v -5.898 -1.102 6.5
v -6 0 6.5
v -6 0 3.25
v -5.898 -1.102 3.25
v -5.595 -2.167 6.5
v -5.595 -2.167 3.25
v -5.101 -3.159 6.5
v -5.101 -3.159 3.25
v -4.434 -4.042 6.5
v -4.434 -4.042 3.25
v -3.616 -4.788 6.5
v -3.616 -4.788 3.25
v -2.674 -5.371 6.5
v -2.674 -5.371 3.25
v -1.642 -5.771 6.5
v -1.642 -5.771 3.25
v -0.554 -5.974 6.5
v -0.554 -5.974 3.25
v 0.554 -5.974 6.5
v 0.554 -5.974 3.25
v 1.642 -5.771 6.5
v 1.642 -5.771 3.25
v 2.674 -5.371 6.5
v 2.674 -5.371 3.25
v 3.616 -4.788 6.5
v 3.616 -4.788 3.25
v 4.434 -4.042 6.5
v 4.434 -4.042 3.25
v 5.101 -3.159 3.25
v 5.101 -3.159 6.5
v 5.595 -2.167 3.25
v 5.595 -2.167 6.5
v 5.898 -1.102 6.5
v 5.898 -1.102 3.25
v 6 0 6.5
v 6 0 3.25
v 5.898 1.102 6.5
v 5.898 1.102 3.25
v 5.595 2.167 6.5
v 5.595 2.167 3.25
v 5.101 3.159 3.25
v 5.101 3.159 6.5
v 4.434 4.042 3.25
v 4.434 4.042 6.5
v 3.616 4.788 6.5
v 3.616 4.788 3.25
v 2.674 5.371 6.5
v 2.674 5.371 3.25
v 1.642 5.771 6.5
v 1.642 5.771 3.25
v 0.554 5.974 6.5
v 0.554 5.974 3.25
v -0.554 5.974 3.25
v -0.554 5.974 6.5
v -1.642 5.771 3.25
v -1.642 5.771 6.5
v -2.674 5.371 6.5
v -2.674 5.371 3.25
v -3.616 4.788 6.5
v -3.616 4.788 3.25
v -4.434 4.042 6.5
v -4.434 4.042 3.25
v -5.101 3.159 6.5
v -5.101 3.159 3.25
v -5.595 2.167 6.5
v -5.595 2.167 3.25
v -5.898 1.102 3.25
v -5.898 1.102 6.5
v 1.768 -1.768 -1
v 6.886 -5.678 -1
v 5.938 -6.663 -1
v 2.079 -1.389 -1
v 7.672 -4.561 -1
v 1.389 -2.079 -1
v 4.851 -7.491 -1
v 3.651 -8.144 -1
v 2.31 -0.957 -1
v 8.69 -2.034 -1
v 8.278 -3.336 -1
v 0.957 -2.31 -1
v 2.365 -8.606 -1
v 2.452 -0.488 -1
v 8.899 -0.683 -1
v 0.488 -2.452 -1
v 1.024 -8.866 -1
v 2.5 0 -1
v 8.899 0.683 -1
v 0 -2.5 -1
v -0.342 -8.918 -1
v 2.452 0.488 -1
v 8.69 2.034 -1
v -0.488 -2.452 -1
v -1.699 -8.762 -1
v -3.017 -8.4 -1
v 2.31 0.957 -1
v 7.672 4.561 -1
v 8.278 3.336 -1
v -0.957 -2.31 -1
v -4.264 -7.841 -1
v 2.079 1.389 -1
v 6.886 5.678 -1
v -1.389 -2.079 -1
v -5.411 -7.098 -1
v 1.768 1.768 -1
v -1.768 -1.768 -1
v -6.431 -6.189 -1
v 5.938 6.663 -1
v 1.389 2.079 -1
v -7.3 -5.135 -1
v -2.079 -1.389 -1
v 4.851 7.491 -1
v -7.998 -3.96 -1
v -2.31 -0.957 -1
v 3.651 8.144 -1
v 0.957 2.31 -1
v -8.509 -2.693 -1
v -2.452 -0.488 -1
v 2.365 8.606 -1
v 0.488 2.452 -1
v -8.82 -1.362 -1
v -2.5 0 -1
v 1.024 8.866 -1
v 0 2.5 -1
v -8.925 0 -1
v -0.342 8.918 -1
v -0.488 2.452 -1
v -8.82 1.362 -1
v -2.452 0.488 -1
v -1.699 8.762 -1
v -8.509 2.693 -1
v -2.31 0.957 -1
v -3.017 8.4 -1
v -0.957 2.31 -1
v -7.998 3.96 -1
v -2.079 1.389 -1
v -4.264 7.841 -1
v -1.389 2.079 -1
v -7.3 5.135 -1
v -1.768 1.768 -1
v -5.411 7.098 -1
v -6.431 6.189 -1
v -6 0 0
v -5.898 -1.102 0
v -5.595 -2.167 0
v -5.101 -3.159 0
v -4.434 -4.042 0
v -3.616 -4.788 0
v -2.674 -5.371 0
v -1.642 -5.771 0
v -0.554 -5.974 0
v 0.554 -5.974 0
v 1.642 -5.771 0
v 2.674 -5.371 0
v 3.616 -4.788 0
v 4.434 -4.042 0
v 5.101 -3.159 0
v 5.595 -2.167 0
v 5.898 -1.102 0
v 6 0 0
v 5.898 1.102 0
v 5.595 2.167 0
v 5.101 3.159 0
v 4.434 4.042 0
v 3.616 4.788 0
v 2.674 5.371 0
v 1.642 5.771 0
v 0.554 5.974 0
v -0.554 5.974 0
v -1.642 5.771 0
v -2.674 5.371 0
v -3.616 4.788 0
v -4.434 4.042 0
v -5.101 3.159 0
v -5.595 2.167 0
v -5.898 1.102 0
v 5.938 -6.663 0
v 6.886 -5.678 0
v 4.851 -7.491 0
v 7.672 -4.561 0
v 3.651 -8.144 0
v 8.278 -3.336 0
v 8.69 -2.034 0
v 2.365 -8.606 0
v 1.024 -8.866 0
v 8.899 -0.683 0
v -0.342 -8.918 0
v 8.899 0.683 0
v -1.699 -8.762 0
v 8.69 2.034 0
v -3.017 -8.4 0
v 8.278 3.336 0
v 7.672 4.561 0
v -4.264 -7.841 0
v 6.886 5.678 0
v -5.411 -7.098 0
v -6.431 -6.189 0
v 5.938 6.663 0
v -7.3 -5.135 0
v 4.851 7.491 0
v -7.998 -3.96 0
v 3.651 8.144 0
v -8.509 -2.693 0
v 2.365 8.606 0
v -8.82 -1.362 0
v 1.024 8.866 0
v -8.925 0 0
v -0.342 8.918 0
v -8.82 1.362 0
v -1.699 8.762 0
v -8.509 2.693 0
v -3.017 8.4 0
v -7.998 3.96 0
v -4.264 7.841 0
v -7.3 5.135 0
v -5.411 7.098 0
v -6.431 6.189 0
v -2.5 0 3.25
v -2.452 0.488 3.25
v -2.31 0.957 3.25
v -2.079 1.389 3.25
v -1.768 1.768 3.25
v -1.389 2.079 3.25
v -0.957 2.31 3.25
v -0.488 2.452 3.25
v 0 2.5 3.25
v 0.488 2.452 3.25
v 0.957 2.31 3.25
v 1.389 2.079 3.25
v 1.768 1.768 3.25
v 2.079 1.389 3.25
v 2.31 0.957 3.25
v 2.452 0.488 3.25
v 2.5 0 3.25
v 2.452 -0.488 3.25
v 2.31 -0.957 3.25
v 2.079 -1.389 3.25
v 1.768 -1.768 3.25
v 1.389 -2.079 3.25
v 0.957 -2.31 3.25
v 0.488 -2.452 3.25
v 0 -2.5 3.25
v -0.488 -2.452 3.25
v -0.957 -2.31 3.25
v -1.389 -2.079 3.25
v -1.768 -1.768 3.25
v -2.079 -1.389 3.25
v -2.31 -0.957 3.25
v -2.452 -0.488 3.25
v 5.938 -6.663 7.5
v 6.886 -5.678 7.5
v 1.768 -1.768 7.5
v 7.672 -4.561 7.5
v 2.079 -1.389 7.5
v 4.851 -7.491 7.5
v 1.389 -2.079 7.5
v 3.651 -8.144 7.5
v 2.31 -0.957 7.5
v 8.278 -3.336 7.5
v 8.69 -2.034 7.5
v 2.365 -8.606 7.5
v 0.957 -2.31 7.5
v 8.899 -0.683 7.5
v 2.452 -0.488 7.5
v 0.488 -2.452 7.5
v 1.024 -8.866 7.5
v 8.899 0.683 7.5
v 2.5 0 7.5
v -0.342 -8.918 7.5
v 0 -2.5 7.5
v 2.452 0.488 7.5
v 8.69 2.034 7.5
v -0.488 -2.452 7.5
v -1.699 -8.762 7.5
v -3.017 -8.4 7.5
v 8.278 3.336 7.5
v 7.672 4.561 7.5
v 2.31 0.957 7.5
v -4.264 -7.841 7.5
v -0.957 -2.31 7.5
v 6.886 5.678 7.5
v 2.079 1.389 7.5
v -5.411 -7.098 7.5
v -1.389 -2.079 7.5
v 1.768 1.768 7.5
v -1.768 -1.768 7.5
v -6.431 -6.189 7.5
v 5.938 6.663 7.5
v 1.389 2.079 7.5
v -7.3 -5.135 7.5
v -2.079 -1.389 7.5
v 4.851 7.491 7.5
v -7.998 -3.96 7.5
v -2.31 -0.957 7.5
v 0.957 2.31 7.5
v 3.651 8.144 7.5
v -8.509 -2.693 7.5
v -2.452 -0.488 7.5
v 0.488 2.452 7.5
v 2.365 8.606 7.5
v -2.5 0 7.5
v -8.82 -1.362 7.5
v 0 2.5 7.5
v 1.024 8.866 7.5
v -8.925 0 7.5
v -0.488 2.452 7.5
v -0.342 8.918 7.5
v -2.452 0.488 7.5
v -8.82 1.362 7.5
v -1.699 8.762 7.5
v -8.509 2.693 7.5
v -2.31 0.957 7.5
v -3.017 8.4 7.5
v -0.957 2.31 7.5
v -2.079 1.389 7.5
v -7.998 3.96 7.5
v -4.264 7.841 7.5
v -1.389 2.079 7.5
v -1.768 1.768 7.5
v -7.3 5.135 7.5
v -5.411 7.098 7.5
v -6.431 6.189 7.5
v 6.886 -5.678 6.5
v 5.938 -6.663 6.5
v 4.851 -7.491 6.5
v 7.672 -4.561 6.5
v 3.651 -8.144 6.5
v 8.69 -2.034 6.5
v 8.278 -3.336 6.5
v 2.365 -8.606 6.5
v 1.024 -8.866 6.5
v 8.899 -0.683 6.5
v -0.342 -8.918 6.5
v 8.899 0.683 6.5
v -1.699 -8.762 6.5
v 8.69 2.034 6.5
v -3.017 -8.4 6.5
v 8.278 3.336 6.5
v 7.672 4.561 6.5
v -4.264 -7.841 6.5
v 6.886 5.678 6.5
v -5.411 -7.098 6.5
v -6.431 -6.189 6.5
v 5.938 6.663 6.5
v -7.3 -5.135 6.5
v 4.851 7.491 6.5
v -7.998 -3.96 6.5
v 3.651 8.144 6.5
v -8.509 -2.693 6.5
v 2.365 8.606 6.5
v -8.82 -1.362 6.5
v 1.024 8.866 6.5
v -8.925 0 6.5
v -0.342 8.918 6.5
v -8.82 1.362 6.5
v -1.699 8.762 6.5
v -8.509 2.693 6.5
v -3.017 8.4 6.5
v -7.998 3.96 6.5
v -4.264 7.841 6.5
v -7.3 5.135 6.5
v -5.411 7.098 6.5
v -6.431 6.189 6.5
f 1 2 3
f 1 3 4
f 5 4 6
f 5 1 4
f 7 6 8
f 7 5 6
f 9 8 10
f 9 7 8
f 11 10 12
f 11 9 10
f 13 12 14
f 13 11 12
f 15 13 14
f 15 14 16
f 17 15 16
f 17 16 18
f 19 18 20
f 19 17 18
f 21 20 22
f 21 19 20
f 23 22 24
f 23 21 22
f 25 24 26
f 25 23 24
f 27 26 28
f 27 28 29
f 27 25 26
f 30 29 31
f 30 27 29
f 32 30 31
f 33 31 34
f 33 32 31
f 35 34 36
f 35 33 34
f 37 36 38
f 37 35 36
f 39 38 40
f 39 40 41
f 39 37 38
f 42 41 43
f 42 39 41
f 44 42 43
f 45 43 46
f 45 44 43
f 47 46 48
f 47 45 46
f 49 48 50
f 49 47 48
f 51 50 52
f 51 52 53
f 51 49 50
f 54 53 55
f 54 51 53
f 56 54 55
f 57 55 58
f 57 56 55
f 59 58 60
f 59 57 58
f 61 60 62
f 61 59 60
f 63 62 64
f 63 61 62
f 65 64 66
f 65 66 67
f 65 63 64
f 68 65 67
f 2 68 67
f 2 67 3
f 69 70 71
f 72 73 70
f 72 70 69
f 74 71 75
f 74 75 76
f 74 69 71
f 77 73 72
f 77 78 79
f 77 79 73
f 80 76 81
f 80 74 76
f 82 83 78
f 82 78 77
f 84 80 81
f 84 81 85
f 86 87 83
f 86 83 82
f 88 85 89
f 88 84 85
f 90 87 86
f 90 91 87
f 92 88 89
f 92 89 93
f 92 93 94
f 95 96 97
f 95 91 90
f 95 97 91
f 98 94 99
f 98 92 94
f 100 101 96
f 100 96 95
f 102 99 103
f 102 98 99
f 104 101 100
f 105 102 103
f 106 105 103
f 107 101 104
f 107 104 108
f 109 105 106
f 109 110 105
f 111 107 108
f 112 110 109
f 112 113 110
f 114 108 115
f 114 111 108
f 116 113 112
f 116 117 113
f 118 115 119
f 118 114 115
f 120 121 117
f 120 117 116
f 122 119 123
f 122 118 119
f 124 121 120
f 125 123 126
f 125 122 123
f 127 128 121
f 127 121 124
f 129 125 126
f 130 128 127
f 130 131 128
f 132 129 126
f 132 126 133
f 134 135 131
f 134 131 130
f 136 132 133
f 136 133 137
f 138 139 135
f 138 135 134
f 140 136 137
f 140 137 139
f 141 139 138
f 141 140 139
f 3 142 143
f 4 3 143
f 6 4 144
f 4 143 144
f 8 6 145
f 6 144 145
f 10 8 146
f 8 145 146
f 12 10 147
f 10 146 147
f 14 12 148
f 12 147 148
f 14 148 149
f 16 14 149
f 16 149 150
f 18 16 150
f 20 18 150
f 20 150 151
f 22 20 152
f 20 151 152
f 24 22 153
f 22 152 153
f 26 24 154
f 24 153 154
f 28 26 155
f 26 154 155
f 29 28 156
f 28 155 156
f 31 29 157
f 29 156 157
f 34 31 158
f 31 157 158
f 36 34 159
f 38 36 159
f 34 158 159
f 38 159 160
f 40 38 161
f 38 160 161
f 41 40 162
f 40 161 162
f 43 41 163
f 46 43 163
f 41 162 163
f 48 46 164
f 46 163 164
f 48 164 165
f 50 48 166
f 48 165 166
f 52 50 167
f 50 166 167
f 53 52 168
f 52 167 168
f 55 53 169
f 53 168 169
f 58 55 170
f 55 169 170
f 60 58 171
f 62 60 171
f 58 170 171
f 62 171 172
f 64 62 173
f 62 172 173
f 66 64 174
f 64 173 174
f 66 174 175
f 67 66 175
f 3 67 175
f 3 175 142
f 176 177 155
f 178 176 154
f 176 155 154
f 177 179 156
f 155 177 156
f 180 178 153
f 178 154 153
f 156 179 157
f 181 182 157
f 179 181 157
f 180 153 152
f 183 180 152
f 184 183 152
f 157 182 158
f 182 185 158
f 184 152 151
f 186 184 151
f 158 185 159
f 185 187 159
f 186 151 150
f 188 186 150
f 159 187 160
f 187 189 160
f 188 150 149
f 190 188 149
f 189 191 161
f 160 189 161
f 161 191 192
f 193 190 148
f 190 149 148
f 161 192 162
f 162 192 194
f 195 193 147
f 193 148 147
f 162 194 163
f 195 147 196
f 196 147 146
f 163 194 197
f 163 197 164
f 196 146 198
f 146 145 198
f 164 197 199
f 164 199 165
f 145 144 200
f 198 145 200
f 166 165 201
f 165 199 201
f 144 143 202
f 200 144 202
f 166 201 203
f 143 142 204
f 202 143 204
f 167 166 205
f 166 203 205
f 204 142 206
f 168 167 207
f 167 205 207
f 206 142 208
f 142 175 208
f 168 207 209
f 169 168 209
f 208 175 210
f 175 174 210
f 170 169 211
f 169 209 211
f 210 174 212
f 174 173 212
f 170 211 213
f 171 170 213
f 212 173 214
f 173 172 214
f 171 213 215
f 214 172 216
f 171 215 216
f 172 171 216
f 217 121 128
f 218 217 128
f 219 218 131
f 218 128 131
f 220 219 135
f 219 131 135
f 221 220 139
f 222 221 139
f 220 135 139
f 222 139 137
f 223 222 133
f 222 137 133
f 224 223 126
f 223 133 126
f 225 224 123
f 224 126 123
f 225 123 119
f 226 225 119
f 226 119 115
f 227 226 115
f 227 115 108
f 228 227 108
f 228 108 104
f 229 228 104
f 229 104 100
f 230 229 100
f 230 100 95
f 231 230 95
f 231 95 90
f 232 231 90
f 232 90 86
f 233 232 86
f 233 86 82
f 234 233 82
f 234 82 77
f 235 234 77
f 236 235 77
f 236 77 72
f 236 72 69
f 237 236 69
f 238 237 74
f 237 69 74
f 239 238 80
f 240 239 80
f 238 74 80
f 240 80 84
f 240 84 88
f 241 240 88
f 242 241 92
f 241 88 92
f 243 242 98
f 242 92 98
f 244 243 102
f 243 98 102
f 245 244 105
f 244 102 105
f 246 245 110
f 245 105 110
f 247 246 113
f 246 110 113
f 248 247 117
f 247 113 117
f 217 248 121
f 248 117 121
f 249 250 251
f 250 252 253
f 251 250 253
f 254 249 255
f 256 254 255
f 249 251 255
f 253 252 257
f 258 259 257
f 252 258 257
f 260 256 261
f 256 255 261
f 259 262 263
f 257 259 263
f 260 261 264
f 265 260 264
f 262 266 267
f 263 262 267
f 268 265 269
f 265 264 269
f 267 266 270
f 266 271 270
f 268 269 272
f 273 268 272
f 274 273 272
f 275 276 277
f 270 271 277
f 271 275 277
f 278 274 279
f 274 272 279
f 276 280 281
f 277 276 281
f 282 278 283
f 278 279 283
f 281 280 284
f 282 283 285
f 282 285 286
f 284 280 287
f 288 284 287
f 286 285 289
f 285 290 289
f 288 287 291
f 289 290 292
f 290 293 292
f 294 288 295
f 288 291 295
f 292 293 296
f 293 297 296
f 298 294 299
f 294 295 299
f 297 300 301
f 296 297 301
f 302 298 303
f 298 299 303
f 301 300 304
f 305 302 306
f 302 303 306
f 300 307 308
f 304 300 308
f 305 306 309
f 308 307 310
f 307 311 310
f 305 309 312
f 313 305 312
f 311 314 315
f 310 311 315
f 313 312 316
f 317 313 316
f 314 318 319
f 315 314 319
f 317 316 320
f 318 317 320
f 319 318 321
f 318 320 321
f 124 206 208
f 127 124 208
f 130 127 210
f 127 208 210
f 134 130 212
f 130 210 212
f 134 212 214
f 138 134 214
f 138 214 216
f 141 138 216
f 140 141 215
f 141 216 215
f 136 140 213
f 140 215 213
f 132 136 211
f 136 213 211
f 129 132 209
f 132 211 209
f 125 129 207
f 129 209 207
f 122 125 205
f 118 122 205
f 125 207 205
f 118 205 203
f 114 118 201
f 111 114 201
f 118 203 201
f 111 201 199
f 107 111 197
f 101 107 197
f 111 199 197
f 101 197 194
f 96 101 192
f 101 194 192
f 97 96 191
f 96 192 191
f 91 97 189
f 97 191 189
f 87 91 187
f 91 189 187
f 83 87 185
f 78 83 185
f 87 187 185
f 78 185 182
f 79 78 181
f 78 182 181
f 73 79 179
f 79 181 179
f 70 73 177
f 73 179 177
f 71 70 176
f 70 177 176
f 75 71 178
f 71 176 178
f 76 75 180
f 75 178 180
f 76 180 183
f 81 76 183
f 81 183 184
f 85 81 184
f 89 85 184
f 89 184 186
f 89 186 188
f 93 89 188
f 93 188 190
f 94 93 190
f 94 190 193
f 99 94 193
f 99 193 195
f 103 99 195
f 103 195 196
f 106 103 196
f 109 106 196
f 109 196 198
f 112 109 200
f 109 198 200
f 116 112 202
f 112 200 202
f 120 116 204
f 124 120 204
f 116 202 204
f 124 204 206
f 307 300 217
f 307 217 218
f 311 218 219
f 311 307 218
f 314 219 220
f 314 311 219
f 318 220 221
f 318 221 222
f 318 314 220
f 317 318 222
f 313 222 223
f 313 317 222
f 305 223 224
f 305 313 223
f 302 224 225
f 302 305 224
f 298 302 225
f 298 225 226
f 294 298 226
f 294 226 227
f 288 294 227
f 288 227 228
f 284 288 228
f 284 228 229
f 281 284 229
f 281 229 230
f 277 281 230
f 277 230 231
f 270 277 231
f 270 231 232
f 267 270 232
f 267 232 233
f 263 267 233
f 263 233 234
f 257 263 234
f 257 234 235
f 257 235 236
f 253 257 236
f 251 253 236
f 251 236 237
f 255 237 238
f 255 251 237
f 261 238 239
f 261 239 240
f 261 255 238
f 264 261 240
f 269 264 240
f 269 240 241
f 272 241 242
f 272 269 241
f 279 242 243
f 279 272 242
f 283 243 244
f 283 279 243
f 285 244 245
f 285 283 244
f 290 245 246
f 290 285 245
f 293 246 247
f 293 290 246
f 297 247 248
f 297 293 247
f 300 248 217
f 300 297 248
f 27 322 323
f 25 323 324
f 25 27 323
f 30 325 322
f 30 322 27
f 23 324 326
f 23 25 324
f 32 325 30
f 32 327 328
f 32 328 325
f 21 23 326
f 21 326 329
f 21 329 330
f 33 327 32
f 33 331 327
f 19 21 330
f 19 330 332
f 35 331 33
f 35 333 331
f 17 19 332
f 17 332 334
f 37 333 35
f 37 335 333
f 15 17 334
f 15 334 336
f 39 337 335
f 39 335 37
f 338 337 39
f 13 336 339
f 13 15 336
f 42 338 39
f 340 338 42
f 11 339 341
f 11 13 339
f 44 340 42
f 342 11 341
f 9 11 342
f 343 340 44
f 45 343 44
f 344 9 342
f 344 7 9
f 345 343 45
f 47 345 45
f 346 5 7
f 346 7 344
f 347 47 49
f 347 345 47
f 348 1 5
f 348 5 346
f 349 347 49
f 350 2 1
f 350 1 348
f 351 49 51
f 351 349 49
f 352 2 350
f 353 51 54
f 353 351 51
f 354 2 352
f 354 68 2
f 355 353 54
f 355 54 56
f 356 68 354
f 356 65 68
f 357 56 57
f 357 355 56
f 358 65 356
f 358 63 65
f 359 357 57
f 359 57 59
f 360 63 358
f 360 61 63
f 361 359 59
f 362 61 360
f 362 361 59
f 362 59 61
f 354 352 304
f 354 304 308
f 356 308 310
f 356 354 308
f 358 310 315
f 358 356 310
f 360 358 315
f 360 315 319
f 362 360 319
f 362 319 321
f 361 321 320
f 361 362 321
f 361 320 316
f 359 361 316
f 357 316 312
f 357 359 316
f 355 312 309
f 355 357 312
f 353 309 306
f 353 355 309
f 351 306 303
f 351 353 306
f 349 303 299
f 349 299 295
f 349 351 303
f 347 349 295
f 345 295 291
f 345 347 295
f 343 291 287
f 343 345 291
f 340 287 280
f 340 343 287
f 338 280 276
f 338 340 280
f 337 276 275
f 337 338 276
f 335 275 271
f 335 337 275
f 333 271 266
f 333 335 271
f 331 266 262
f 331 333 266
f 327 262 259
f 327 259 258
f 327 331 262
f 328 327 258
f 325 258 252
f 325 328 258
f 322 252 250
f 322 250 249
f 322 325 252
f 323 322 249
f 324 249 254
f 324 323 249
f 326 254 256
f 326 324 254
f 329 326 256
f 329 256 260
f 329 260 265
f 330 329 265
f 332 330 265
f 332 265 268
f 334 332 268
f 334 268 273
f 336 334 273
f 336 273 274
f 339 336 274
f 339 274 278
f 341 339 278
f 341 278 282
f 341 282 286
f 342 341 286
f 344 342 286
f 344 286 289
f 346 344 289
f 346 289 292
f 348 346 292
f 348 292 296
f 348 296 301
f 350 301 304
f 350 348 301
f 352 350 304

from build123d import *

# Parameters (mm, degrees)
SKETCH6_R           = 6
BOSS_EXTRUDE1_DEPTH = 3.25
SKETCH8_R           = 8.925
BOSS_EXTRUDE2_DEPTH = 1
SKETCH9_R           = 2.5
CUT_EXTRUDE1_DEPTH  = 14.318173674


with BuildPart() as part:
    # Sketch6 → Boss-Extrude1 (new body)
    with BuildSketch(Plane.XY):
        with Locations(Location((0, 0, 0), (0, 0, 180))):
            Circle(SKETCH6_R)
    boss_extrude1 = extrude(amount=BOSS_EXTRUDE1_DEPTH)

    # Sketch8 → Boss-Extrude2 (add)
    with BuildSketch(Plane(origin=(0, 0, 0), x_dir=(-1, 0, 0), z_dir=(0, 0, -1))):
        Circle(SKETCH8_R)
    boss_extrude2 = extrude(amount=BOSS_EXTRUDE2_DEPTH)

    # Sketch9 → Cut-Extrude1 (cut, through all)
    with BuildSketch(Plane(origin=(0, 0, -1), x_dir=(-1, 0, 0), z_dir=(0, 0, -1))):
        Circle(SKETCH9_R)
    cut_extrude1 = extrude(amount=-CUT_EXTRUDE1_DEPTH, mode=Mode.SUBTRACT)

    # Mirror2: Boss-Extrude1, Boss-Extrude2, Cut-Extrude1 across plane
    add(boss_extrude1.mirror(Plane.XY.offset(3.25)))
    add(boss_extrude2.mirror(Plane.XY.offset(3.25)))
    add(cut_extrude1.mirror(Plane.XY.offset(3.25)), mode=Mode.SUBTRACT)


solid = part.part
